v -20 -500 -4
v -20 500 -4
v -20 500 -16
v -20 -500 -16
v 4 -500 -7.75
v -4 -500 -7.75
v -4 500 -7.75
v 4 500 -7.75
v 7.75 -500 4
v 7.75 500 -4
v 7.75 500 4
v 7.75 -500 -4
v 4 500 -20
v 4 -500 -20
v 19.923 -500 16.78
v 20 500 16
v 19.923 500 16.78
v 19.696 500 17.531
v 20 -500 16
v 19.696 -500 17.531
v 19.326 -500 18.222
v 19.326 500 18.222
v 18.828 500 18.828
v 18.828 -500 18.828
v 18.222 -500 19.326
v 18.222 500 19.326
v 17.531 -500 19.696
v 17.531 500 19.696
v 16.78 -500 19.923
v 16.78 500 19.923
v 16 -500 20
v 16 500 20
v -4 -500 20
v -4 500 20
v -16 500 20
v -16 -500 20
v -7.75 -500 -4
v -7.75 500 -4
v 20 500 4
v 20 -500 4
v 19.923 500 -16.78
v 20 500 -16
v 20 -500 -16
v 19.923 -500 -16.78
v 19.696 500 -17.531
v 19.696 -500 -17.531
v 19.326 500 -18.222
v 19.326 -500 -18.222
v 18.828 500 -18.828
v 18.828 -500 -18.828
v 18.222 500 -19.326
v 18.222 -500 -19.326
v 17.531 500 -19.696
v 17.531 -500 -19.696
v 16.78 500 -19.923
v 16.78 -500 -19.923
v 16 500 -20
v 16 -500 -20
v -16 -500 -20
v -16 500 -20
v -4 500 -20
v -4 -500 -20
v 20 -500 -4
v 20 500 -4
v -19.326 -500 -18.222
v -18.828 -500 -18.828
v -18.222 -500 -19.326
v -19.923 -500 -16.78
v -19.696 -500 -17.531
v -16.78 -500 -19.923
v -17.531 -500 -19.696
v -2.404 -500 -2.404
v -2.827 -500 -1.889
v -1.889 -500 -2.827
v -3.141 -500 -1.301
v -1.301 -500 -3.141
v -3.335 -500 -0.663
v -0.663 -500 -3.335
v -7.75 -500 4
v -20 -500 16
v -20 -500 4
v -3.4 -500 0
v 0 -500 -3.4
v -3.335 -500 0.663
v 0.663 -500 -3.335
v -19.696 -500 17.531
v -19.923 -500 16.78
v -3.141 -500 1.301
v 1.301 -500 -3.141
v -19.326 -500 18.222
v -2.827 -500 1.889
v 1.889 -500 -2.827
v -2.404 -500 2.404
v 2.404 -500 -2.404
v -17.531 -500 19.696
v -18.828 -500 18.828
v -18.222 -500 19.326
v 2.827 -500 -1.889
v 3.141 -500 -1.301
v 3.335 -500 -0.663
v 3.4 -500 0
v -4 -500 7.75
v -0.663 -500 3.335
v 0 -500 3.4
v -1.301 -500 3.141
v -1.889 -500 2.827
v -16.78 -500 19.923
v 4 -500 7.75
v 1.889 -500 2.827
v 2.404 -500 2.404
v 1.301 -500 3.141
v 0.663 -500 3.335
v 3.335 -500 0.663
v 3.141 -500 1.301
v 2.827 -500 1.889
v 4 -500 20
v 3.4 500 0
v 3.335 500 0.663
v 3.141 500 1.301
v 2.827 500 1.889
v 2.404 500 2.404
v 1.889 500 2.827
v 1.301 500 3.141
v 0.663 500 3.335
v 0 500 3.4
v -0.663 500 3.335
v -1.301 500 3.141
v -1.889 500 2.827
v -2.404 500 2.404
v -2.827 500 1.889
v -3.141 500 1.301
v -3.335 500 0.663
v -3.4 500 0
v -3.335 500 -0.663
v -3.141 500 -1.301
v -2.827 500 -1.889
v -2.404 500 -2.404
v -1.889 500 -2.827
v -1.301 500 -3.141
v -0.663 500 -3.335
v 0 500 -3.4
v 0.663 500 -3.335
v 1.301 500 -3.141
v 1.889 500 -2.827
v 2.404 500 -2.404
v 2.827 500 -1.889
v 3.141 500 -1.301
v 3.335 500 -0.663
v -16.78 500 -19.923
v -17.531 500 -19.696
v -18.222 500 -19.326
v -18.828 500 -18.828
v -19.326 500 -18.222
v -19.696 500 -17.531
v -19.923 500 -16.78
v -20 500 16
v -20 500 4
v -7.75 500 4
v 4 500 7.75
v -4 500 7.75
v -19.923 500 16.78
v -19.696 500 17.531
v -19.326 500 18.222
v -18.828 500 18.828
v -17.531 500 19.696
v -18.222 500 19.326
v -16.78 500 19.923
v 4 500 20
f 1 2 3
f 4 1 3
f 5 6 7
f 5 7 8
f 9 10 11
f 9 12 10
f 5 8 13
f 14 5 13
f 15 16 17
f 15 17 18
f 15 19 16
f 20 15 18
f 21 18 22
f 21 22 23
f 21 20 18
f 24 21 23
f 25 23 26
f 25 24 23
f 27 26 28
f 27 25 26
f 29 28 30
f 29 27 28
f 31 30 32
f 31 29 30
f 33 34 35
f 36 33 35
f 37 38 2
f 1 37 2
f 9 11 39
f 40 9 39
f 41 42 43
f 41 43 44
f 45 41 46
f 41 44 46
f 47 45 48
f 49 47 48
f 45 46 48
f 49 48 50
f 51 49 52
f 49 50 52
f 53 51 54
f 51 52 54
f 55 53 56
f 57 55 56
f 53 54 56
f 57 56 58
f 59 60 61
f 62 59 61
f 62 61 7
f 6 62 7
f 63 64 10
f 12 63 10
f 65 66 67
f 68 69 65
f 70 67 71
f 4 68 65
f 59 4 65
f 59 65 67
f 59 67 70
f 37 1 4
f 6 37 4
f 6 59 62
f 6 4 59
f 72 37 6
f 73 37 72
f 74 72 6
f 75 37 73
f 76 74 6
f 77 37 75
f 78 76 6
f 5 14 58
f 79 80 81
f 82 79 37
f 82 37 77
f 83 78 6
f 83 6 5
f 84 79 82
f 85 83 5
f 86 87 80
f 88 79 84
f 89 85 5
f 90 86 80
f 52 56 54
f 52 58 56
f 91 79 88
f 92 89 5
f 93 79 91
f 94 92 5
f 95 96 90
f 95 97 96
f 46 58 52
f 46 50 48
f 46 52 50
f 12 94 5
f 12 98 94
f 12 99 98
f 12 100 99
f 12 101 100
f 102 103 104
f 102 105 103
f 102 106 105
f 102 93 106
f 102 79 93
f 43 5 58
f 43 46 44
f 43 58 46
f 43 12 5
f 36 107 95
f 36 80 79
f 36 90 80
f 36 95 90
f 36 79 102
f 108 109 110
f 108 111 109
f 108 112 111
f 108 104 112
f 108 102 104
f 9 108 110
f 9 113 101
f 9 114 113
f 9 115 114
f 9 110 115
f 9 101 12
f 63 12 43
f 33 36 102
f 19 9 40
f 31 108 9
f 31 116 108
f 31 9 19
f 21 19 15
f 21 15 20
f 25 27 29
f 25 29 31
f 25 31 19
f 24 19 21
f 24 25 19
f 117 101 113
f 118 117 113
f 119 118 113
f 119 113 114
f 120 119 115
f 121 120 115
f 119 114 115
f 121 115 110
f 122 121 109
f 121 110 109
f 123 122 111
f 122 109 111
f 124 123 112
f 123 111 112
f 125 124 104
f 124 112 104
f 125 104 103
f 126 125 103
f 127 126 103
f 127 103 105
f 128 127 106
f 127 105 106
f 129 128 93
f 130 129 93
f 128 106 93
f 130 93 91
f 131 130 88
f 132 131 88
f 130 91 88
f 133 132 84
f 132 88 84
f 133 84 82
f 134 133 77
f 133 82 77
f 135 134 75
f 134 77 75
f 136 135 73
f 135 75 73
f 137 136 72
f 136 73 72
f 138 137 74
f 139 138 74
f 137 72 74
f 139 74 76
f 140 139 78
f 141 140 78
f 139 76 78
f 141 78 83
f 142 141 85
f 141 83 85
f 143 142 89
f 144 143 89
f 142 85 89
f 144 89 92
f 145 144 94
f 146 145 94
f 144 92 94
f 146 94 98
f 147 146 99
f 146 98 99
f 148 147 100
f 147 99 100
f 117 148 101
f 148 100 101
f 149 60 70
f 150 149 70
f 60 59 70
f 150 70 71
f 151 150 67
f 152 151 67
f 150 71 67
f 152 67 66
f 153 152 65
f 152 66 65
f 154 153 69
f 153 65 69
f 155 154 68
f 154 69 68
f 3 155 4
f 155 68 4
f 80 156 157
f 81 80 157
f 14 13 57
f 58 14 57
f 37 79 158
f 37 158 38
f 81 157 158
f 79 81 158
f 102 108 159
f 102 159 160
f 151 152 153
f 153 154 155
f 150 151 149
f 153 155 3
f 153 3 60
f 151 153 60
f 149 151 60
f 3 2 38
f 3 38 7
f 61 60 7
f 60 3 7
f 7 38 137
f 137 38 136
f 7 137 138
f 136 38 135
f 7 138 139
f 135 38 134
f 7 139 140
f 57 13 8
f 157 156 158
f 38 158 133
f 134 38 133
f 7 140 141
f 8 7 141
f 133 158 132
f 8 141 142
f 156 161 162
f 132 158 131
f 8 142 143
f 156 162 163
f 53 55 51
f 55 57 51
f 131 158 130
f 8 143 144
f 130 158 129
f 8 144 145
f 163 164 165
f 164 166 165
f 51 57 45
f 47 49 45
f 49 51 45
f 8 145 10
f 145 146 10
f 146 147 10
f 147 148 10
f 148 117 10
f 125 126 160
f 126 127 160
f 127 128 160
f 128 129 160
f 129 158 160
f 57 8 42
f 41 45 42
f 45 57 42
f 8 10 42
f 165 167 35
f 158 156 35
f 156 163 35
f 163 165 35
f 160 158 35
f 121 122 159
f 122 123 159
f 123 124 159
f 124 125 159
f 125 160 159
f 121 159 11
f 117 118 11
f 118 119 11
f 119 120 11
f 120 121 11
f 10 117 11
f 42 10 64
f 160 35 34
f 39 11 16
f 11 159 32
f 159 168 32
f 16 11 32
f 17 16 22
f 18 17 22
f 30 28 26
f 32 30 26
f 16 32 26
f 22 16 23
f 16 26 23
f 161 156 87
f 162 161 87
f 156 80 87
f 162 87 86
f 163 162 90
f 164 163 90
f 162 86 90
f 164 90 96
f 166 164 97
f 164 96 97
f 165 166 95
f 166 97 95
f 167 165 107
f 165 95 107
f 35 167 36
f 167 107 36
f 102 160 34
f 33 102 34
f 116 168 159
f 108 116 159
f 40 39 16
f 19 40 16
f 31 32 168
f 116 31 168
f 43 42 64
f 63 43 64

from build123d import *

# Parameters (mm, degrees)
F1_DEPTH = 500
F2_R     = 4
F3_R     = 3.4
F4_DEPTH = 1000


with BuildPart() as f1:
    # F0 (on Front) → F1 (new body, symmetric)
    with BuildSketch(Plane.XZ):
        Polygon((20, 4), (20, 20), (4, 20), (4, 7.75), (-4, 7.75), (-4, 20), (-20, 20), (-20, 4), (-7.75, 4), (-7.75, -4), (-20, -4), (-20, -20), (-4, -20), (-4, -7.75), (4, -7.75), (4, -20), (20, -20), (20, -4), (7.75, -4), (7.75, 4), align=None)
    extrude(amount=F1_DEPTH, both=True)

    # F2
    f2_edges = [f1.edges().sort_by_distance(p)[0] for p in [
        (-20, 0, 20),
        (20, 0, 20),
        (20, 0, -20),
        (-20, 0, -20),
    ]]
    fillet(f2_edges, radius=F2_R)

    # F3 (on face) → F4 (cut)
    with BuildSketch(Plane.XZ.offset(500)):
        Circle(F3_R)
    extrude(amount=-F4_DEPTH, mode=Mode.SUBTRACT)


solid = f1.part
